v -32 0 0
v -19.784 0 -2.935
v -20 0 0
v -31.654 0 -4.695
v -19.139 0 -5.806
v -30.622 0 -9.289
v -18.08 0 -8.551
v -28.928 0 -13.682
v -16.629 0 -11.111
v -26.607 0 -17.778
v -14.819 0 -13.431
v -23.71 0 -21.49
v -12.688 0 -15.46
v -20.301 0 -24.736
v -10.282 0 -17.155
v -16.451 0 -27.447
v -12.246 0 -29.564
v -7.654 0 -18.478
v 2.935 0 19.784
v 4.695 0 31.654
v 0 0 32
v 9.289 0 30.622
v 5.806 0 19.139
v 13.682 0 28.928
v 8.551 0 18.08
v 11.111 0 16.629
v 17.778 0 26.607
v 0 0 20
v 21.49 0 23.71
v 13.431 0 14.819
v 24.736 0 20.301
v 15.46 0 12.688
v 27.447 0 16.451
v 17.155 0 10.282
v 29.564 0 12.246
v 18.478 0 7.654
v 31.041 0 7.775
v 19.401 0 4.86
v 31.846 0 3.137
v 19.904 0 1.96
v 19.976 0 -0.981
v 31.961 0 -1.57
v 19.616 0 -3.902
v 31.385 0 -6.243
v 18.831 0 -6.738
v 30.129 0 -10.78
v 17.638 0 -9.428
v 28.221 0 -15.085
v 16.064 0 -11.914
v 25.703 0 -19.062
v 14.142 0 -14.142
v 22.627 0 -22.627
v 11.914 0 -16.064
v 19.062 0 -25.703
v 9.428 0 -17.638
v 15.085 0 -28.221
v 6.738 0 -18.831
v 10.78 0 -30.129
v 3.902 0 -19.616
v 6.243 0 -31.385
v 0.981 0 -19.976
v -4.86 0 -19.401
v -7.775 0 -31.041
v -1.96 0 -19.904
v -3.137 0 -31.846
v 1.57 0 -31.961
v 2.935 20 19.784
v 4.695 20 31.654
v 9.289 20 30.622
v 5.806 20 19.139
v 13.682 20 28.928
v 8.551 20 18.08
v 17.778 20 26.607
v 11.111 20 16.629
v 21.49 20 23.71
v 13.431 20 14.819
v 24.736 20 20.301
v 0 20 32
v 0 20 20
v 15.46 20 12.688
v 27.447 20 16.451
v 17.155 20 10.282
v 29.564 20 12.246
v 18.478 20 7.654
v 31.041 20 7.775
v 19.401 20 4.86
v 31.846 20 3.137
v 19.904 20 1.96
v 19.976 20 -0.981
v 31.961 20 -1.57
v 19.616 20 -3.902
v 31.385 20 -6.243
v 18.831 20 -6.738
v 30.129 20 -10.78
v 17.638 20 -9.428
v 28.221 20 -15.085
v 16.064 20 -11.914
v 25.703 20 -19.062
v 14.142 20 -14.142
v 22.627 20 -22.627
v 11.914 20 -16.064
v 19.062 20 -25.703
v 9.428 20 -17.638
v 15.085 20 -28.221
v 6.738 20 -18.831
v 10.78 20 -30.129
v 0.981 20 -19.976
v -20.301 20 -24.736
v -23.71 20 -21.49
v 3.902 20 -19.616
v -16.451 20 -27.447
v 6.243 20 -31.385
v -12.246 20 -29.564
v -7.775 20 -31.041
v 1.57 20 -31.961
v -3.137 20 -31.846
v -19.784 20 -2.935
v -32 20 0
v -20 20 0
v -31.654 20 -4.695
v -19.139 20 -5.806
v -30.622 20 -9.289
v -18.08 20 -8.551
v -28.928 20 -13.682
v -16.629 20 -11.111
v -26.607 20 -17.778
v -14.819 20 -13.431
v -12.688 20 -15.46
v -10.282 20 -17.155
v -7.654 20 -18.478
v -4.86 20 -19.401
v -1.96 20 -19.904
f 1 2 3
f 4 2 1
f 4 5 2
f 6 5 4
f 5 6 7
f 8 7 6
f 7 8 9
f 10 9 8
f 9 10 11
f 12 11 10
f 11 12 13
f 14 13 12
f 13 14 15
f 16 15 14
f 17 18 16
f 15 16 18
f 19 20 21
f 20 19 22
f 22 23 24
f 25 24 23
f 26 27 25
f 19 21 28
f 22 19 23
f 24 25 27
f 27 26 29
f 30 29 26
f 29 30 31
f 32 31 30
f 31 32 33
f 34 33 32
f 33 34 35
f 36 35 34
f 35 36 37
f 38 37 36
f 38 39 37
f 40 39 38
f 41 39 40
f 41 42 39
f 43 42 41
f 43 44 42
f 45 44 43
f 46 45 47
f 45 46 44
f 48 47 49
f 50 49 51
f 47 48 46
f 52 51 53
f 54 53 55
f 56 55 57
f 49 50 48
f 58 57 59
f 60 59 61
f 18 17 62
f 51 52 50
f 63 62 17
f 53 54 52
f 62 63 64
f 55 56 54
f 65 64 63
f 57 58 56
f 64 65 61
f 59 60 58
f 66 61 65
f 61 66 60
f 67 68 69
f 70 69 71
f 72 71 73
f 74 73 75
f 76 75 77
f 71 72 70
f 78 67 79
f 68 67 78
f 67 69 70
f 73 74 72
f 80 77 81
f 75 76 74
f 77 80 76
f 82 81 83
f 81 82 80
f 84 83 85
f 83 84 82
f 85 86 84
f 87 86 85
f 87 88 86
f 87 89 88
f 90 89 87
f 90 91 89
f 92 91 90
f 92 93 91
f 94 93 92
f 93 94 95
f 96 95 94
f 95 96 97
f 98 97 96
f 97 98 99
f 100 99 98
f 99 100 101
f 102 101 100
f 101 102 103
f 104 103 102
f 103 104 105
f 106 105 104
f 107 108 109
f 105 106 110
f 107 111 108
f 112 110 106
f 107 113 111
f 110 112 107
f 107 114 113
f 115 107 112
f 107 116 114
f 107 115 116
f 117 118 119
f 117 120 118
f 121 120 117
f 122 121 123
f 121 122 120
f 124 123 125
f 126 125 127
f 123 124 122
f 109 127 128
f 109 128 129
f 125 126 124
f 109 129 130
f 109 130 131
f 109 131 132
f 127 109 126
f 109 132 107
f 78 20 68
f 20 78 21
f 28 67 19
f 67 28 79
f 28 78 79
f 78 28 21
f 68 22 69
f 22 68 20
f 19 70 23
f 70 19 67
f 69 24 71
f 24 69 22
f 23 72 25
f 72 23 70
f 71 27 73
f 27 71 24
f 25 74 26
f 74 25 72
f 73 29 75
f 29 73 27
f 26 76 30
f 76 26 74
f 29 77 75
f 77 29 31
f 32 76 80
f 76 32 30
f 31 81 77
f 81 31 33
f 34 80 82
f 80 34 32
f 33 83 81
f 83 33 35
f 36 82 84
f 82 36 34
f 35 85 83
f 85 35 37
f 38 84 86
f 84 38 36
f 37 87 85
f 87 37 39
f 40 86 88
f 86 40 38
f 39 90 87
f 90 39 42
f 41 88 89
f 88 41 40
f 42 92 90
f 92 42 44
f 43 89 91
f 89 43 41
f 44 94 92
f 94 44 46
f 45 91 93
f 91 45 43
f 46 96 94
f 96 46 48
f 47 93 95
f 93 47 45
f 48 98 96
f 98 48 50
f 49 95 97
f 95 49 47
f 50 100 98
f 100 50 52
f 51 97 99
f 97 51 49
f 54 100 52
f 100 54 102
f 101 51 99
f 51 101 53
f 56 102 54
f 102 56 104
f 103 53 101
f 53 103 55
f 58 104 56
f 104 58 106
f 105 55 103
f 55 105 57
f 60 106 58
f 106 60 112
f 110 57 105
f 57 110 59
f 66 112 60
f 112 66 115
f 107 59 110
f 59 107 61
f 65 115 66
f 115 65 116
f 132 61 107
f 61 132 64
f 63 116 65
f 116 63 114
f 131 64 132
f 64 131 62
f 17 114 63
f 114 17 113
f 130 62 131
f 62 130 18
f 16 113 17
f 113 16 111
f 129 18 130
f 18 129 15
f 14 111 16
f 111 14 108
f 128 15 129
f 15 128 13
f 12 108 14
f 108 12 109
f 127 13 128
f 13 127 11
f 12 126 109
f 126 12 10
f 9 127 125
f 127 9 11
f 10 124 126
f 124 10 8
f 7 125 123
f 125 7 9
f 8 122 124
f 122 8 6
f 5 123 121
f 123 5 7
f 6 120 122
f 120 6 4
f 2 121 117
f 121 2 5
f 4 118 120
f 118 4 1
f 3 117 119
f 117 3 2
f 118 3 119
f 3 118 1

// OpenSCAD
//
//
//

module first_balcony_section(inner_radius = 20,
                             outer_radius = 32,
                             tower_height = 20,
                             thickness = 3,
                             angle_start = 0,
                             angle_sweep = 20,
                             subsection,
                             subsection_count = 4)
{
    subsection_angle_sweep = angle_sweep / subsection_count;

    p0x = inner_radius * sin(angle_start + (subsection * subsection_angle_sweep));
    p0y = tower_height - thickness;
    p0z = inner_radius * cos(angle_start + (subsection * subsection_angle_sweep));

    p1x = outer_radius * sin(angle_start + (subsection * subsection_angle_sweep));
    p1y = tower_height - thickness;
    p1z = outer_radius * cos(angle_start + (subsection * subsection_angle_sweep));

    // p2 and p3 are on the left of the section
    p2x = outer_radius * sin(angle_start + (subsection * subsection_angle_sweep) + subsection_angle_sweep);
    p2y = tower_height - thickness;
    p2z = outer_radius * cos(angle_start + (subsection * subsection_angle_sweep) + subsection_angle_sweep);

    p3x = inner_radius * sin(angle_start + (subsection * subsection_angle_sweep) + subsection_angle_sweep);
    p3y = tower_height - thickness;
    p3z = inner_radius * cos(angle_start + (subsection * subsection_angle_sweep) + subsection_angle_sweep);

    section_points = [[p0x, p0y, p0z],
                      [p1x, p1y, p1z],
                      [p2x, p2y, p2z],
                      [p3x, p3y, p3z],
                      [p0x, p0y + thickness, p0z],
                      [p1x, p1y + thickness, p1z],
                      [p2x, p2y + thickness, p2z],
                      [p3x, p3y + thickness, p3z],
                      ];

    polyhedron(points=section_points,
               faces=[[3, 2, 1, 0], // bottom
                      [4, 5, 6, 7], // top
                      [1, 2, 6, 5], // far
                      [0, 4, 7, 3], // near
                      [0, 1, 5, 4], // right
                      [7, 6, 2, 3]] // left
               );
}


inner_radius = 20;
outer_radius = 32;
tower_height = 20;
thickness = 3;
angle_start = 0;
subsection_count = 4;
sections = 8;
total_angle_sweep = 270.0;
section_angle_sweep = total_angle_sweep / sections;
half_section_angle_sweep = section_angle_sweep / 2.0;

arch_height_ratio = 0.7;

// radius of arch-cutout cone at the inner side of the wall
arch_radius = (tower_height - thickness) - (tower_height * arch_height_ratio);
// 1/2 horizontal angle sweep to get from one side of arch-cutout to the other
arch_half_angle = asin(arch_radius / inner_radius);
// radius of arch cutout 1 closer than inner_radius
arch_cone_inner_radius = sin(arch_half_angle) * (inner_radius - 1.0);

// do a goatse stretch on the arch cutouts so that the supports touch down as a rectagle, despite the curve
cylinder_length = (outer_radius - inner_radius + 2.0);
d = (sin(half_section_angle_sweep) * (inner_radius - 1.0)) -
    (sin(half_section_angle_sweep) * (outer_radius + 1.0));
minkowski_points = [[0, 0, 0],
                    [-d, 0, cylinder_length],
                    [d, 0, cylinder_length]];



combined = 1; // this can be overridden by the Makefile

if (combined == 1) {
    difference() {
        for(nth=[0:1:(sections * subsection_count - 1)]) {
            // subsection = nth - floor(nth / subsection_count);
            // for(subsection=[0:1:(subsection_count-1)]) {
                first_balcony_section(inner_radius = inner_radius,
                                      outer_radius = outer_radius,
                                      tower_height = tower_height,
                                      thickness = tower_height,
                                      angle_start = angle_start + (floor(nth / subsection_count) * section_angle_sweep),
                                      angle_sweep = section_angle_sweep,
                                      subsection = nth - (floor(nth / subsection_count) * subsection_count),
                                      subsection_count = subsection_count);
             // }
        }

        // cut out arches
        for(nth=[0:1:(sections-1)]) {
            rotate([0, section_angle_sweep * nth + section_angle_sweep / 2.0, 0])
                translate([0, tower_height * arch_height_ratio, inner_radius-1])
                minkowski() {
                     union() {
                         cylinder(h=cylinder_length,
                                  r=arch_cone_inner_radius,
                                  $fs=0.5);

                         translate([0, - tower_height / 2.0, cylinder_length / 2.0])
                         cube([arch_cone_inner_radius * 2.0,
                               tower_height,
                               cylinder_length],
                              center = true);
                     }
                     polyhedron(points=minkowski_points, faces=[[0, 1, 2]]);
            }
        }
    }
 } else {
    // combined isn't 1, so we are making part of the collision hull.  nth will have been set by the invoker of openscad.
    first_balcony_section(inner_radius = inner_radius,
                          outer_radius = outer_radius,
                          tower_height = tower_height,
                          thickness = thickness,
                          angle_start = angle_start + (floor(nth / subsection_count) * section_angle_sweep),
                          angle_sweep = section_angle_sweep,
                          subsection = nth - (floor(nth / subsection_count) * subsection_count),
                          subsection_count = subsection_count);
 }
